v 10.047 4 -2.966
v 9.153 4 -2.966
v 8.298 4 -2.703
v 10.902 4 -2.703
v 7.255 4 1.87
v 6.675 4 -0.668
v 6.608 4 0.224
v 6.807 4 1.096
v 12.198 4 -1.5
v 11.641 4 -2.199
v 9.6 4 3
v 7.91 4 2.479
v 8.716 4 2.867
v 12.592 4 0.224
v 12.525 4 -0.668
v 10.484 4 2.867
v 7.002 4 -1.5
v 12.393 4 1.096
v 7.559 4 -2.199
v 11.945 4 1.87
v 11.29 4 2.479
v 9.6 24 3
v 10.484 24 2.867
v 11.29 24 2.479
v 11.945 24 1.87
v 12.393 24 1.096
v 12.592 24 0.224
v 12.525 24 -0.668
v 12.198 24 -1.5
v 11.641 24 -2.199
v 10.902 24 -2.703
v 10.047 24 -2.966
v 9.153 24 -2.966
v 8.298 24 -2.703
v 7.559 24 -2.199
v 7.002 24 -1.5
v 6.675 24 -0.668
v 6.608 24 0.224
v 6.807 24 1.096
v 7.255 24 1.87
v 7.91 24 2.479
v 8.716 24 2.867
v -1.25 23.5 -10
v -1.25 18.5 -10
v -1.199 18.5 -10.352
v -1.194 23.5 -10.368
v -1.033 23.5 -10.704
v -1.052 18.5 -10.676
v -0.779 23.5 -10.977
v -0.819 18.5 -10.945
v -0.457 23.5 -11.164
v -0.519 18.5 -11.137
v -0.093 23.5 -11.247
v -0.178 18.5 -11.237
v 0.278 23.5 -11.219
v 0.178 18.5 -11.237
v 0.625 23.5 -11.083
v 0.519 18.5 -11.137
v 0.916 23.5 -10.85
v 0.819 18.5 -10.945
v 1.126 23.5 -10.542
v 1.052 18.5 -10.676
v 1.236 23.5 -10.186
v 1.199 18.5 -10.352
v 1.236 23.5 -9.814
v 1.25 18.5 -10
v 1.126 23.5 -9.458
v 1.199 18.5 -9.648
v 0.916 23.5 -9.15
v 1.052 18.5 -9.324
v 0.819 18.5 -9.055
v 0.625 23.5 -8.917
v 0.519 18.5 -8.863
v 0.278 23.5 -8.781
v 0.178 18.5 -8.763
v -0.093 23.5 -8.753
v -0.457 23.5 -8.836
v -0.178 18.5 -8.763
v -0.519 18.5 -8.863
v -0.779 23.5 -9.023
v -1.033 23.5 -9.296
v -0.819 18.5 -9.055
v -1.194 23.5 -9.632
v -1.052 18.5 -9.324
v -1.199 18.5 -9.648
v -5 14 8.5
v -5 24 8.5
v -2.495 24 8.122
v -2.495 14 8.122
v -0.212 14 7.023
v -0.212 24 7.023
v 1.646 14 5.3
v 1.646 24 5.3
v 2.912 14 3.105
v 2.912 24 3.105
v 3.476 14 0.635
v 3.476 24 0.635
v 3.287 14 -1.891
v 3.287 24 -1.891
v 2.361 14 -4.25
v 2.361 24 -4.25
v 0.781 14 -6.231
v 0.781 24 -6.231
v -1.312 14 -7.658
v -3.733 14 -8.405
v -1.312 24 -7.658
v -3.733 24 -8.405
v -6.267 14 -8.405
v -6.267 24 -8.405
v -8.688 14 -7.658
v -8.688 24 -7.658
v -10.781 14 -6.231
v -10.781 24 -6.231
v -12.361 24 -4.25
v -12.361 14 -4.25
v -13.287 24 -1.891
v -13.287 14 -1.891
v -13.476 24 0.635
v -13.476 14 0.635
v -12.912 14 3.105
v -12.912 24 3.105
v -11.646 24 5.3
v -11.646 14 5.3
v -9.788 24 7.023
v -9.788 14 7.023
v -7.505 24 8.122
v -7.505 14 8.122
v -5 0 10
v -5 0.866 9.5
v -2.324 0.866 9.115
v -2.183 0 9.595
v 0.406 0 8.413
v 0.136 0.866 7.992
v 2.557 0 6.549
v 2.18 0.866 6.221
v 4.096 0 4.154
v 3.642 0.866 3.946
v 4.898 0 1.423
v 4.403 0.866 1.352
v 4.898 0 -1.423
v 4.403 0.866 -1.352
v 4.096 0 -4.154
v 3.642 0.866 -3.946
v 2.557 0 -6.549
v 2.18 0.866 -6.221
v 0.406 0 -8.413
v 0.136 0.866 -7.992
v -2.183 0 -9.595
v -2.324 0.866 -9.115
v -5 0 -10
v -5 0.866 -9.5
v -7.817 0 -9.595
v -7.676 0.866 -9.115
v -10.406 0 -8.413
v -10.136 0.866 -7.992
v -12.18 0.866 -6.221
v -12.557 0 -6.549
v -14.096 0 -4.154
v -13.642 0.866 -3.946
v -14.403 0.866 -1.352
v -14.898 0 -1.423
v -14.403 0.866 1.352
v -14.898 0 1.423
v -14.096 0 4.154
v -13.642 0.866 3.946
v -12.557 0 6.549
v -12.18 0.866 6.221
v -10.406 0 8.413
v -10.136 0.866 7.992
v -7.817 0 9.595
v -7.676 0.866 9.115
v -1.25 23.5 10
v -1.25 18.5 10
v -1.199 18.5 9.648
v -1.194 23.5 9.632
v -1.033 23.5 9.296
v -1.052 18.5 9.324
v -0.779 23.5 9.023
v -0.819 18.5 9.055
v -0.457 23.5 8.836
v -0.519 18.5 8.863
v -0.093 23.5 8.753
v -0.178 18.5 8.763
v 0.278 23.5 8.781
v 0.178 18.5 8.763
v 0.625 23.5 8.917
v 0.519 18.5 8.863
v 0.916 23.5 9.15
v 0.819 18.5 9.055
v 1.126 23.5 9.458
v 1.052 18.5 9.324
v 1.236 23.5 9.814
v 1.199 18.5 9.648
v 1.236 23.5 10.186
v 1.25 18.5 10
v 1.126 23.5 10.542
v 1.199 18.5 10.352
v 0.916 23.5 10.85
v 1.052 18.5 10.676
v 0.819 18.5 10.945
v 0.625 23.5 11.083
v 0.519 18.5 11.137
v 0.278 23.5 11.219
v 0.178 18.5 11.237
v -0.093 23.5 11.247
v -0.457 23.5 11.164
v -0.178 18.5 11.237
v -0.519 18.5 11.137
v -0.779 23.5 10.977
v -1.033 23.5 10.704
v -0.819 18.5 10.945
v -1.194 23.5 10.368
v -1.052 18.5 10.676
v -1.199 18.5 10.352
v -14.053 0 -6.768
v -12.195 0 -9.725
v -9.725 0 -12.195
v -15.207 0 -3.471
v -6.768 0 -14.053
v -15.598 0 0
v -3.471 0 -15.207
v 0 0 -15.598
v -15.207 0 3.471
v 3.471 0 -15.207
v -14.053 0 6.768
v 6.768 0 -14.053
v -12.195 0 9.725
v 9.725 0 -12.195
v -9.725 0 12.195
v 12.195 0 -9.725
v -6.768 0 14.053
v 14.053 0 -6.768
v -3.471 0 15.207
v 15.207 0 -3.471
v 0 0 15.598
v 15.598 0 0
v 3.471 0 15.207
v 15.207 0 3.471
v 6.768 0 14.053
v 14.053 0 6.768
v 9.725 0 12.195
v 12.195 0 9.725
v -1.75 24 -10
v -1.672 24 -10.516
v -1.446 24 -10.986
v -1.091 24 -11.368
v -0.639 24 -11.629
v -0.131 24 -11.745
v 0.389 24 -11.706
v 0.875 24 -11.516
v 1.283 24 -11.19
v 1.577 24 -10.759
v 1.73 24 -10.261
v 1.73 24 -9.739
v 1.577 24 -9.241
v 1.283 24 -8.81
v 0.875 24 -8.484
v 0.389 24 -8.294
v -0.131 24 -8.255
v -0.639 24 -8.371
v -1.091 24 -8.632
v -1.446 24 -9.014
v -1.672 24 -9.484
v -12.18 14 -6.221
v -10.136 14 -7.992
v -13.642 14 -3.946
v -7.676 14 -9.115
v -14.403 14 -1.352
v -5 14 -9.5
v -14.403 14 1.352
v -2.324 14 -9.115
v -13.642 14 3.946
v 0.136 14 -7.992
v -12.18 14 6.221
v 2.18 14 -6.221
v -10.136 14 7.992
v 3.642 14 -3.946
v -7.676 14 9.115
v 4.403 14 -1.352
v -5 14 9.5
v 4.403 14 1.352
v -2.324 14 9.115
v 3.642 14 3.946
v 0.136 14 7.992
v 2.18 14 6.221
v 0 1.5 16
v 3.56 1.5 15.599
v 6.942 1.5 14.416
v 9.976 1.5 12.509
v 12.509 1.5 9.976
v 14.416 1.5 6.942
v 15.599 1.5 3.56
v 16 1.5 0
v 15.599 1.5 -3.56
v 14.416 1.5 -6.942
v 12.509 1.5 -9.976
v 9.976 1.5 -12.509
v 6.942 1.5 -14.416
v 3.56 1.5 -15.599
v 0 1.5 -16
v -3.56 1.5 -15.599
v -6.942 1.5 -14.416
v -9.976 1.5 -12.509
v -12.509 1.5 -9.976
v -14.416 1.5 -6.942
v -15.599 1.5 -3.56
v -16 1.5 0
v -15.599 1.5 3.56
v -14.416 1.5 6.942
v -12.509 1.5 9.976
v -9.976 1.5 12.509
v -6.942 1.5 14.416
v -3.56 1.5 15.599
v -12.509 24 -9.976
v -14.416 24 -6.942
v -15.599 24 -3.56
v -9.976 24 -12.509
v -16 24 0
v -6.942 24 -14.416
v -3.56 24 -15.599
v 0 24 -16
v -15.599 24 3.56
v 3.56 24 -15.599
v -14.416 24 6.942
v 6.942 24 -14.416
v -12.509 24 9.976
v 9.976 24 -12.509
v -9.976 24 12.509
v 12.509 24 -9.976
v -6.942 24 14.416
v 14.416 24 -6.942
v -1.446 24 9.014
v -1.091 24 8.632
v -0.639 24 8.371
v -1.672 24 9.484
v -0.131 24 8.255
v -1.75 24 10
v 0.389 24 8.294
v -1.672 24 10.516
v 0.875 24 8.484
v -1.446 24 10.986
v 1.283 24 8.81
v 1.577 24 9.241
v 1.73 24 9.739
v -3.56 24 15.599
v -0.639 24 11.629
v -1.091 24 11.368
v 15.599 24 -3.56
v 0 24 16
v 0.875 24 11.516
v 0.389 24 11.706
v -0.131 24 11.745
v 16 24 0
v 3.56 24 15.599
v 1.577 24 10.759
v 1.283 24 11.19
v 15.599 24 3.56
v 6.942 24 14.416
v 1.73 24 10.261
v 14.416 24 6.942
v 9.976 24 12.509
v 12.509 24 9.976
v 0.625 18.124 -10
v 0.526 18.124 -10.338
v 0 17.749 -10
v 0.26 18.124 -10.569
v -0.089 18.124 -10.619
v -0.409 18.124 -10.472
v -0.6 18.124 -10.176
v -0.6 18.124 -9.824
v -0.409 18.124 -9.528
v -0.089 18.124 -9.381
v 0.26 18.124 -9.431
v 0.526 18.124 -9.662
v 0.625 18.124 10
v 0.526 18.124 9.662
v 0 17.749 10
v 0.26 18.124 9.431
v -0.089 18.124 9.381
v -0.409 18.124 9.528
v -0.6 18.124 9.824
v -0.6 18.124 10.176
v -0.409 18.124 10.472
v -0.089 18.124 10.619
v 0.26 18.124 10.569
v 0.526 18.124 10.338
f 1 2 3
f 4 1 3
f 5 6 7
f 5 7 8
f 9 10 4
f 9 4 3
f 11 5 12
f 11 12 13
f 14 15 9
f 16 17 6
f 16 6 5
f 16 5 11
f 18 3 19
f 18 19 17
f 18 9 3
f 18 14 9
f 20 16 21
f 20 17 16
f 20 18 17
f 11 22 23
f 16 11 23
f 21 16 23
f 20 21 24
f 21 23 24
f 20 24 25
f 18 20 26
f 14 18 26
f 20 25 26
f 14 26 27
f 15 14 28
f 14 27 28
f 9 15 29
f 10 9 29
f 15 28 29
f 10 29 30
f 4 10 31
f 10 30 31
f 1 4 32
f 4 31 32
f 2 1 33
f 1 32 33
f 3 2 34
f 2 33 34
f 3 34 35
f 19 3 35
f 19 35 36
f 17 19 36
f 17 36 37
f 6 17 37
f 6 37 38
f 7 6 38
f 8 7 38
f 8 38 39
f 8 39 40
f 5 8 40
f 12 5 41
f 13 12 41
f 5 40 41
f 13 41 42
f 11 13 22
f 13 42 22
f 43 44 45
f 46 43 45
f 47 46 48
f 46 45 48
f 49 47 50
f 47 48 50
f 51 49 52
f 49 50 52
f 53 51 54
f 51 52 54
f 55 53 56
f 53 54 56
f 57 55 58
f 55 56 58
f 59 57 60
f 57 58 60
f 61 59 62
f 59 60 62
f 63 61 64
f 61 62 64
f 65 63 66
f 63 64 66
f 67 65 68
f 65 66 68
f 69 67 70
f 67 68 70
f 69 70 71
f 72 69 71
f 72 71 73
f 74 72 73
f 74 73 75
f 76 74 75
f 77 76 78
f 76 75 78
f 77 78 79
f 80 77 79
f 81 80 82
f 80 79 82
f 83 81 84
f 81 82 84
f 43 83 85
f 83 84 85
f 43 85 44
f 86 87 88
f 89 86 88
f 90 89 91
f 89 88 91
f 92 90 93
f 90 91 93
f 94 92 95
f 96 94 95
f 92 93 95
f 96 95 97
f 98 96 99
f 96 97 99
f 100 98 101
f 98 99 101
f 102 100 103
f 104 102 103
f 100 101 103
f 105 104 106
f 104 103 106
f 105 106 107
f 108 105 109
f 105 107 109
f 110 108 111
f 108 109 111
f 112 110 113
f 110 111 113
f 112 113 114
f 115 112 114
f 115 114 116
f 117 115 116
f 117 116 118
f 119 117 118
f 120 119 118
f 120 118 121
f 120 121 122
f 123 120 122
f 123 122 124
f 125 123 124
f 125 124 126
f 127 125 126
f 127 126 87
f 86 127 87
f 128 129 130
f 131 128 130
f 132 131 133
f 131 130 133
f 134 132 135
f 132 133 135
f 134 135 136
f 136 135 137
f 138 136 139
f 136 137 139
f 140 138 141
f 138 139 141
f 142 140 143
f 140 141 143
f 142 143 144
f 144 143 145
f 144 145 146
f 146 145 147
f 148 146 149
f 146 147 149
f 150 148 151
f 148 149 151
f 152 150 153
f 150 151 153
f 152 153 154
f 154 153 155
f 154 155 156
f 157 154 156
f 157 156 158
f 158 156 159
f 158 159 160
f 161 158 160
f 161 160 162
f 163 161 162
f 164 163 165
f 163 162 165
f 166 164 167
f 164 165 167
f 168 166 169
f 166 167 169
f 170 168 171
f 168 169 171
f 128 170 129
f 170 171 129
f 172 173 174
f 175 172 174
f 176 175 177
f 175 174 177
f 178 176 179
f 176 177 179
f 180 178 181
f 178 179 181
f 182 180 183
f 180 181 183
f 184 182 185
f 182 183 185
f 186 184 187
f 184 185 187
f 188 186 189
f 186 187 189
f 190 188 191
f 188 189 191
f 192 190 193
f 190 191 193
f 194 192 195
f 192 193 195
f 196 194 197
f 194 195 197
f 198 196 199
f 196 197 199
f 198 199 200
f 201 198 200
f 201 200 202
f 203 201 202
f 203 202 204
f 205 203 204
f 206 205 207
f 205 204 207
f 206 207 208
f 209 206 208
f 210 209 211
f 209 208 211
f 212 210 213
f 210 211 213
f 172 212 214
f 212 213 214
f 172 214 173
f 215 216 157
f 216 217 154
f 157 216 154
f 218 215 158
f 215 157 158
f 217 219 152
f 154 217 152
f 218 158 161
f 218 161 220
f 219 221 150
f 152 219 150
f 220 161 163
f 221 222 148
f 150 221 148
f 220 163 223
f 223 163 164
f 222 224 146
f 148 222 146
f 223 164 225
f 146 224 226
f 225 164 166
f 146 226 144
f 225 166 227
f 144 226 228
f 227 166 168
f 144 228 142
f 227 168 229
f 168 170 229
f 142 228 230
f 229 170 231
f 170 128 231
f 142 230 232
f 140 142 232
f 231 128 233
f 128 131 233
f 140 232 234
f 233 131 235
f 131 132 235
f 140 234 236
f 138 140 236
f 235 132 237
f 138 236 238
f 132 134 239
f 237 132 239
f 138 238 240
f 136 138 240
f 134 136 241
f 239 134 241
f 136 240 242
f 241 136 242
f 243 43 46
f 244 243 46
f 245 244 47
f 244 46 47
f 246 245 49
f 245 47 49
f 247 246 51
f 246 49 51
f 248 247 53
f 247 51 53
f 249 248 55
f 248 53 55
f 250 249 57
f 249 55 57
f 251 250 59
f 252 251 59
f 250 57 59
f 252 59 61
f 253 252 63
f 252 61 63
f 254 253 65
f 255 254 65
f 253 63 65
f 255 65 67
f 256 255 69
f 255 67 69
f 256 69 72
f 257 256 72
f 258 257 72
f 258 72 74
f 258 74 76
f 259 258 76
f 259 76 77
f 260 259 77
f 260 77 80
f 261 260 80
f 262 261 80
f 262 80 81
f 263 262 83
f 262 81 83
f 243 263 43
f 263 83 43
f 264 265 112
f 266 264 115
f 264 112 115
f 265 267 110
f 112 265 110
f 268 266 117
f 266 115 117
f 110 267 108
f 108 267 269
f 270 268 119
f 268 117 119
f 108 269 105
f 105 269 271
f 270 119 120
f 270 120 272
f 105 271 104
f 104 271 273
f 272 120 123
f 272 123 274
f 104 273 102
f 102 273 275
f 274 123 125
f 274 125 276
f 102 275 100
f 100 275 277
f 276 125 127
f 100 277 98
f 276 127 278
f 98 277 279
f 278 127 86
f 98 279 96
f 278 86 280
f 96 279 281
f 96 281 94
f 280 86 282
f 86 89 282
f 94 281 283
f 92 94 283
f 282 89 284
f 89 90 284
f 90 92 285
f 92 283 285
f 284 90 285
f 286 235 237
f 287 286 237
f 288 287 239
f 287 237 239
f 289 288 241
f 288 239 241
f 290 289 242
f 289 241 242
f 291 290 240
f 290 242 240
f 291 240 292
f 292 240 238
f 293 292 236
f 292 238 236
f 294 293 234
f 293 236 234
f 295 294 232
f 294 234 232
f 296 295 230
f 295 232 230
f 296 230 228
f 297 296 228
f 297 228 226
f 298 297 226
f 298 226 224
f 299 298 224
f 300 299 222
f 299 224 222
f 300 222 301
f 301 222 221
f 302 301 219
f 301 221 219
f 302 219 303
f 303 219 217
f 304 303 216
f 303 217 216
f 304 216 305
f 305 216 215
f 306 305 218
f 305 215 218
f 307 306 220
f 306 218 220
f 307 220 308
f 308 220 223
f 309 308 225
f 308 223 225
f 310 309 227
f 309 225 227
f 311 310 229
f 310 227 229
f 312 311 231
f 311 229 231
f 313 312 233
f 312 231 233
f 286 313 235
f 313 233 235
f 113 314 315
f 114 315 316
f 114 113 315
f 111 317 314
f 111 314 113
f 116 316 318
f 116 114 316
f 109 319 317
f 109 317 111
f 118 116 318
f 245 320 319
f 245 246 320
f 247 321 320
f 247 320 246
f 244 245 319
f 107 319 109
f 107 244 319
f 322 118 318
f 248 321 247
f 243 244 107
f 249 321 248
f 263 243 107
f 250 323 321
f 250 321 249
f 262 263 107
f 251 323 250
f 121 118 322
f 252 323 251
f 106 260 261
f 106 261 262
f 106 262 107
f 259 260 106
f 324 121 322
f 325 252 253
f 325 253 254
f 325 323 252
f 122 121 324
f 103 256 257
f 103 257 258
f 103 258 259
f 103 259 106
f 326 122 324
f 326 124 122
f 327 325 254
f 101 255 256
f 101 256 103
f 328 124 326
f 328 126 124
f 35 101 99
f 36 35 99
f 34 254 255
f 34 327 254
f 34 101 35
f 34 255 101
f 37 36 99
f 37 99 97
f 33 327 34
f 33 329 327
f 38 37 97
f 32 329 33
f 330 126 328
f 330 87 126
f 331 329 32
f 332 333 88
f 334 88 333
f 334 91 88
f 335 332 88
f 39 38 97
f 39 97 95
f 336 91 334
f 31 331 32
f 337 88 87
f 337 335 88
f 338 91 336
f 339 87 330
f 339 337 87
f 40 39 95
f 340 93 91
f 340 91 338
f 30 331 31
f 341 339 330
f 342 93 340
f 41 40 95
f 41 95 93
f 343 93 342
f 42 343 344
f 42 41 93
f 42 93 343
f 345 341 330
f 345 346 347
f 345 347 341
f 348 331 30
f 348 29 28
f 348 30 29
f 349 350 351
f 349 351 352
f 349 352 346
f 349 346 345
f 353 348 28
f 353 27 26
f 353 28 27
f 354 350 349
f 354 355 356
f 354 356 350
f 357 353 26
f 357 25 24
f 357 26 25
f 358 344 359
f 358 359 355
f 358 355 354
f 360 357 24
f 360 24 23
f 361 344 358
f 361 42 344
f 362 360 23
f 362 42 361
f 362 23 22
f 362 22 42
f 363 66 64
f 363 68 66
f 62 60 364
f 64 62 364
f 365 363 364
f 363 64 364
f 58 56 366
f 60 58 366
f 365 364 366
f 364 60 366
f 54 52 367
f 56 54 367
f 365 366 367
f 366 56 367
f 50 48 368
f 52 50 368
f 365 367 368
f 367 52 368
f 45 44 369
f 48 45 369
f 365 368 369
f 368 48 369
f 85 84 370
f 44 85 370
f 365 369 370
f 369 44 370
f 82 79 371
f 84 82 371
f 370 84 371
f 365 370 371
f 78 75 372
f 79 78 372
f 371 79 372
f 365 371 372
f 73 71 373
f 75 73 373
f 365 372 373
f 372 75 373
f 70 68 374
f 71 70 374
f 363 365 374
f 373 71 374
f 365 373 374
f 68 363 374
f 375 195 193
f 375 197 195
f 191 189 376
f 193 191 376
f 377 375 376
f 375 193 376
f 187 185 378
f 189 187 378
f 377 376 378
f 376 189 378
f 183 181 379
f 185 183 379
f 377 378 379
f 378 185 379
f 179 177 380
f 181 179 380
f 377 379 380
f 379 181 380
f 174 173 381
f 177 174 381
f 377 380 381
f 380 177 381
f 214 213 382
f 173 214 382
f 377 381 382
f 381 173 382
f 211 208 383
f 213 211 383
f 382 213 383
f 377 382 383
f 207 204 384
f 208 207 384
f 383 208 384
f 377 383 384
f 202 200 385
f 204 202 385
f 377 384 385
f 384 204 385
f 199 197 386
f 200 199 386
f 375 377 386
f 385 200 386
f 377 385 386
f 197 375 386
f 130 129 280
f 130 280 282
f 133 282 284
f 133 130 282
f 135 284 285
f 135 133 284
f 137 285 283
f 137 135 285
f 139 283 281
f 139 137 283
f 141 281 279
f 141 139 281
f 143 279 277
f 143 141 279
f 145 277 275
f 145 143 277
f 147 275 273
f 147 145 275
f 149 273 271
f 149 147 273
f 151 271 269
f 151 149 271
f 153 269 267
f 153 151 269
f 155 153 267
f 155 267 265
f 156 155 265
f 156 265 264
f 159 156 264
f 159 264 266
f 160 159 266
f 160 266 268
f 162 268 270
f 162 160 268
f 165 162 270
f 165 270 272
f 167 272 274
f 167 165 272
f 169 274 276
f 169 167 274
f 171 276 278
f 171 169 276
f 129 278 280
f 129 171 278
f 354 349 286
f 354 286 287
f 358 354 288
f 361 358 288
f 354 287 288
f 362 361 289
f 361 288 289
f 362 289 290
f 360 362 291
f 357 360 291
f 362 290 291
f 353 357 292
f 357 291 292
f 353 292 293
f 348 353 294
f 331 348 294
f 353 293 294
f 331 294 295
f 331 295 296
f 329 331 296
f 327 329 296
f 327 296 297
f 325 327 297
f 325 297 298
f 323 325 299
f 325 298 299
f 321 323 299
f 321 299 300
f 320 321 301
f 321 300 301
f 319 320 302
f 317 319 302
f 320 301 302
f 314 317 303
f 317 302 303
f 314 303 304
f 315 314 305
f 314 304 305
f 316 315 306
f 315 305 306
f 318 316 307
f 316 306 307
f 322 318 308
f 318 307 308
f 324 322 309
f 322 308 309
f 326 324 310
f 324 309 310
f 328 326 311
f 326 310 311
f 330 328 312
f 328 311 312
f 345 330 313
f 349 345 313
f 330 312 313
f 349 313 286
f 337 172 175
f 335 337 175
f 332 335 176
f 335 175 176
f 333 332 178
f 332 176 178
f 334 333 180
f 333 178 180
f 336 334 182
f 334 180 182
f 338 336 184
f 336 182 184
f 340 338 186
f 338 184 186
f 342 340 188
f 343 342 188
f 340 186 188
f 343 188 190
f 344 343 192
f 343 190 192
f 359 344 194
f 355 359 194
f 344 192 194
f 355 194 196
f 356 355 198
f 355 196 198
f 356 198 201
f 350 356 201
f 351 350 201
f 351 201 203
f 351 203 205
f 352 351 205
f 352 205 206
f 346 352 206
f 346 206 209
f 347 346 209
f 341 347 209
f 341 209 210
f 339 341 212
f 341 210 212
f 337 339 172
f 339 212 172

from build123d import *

# Parameters (mm, degrees)
SKETCH_1_R          = 16
EXTRUDE_1_DEPTH     = 24
SKETCH_2_R          = 8.5
CUT_EXTRUDE_1_DEPTH = 14
SKETCH_3_R          = 3
CUT_EXTRUDE_2_DEPTH = 20
SKETCH_4_R          = 9.5
CUT_EXTRUDE_4_DEPTH = 14
CHAMFER_1_SIZE      = 0.5
CHAMFER_1_SIZE2     = 0.866025404
CHAMFER_2_SIZE      = 1.5
CHAMFER_2_SIZE2     = 0.401923789
M3X0_51_D           = 2.5
M3X0_51_DEPTH       = 5.5
M3X0_51_TIP         = 0.751075774
CHAMFER_3_SIZE      = 0.5


with BuildPart() as part:
    # Эскиз1 → Бобышка-Вытянуть1 (new body)
    with BuildSketch(Plane(origin=(0, 0, 0), x_dir=(1, 0, 0), z_dir=(0, 1, 0))):
        with Locations(Location((0, 0, 0), (0, 0, 270))):
            Circle(SKETCH_1_R)
    extrude(amount=EXTRUDE_1_DEPTH)

    # Эскиз2 → Вырез-Вытянуть1 (cut)
    with BuildSketch(Plane(origin=(0, 24, 0), x_dir=(1, 0, 0), z_dir=(0, 1, 0))):
        with Locations(Location((-5, 0, 0), (0, 0, 270))):
            Circle(SKETCH_2_R)
    extrude(amount=-CUT_EXTRUDE_1_DEPTH, mode=Mode.SUBTRACT)

    # Эскиз3 → Вырез-Вытянуть2 (cut)
    with BuildSketch(Plane(origin=(0, 24, 0), x_dir=(1, 0, 0), z_dir=(0, 1, 0))):
        with Locations(Location((9.6, 0, 0), (0, 0, 270))):
            Circle(SKETCH_3_R)
    extrude(amount=-CUT_EXTRUDE_2_DEPTH, mode=Mode.SUBTRACT)

    # Эскиз4 → Вырез-Вытянуть4 (cut)
    with BuildSketch(Plane(origin=(0, 0, 0), x_dir=(1, 0, 0), z_dir=(0, 1, 0))):
        with Locations(Location((-5, 0, 0), (0, 0, 270))):
            Circle(SKETCH_4_R)
    extrude(amount=CUT_EXTRUDE_4_DEPTH, mode=Mode.SUBTRACT)

    # Фаска1
    chamfer_1_edges = [part.edges().sort_by_distance(p)[0] for p in [
        (-5, 0, -9.5),
    ]]
    chamfer_1_side = [part.faces().sort_by_distance(p)[0] for p in [
        (0, 0, -15.54745166),
    ]]
    chamfer(chamfer_1_edges, length=CHAMFER_1_SIZE, length2=CHAMFER_1_SIZE2, reference=chamfer_1_side[0])

    # Фаска2
    chamfer_2_edges = [part.edges().sort_by_distance(p)[0] for p in [
        (0, 0, -16),
    ]]
    chamfer_2_side = [part.faces().sort_by_distance(p)[0] for p in [
        (0, 12, -16),
    ]]
    chamfer(chamfer_2_edges, length=CHAMFER_2_SIZE, length2=CHAMFER_2_SIZE2, reference=chamfer_2_side[0])

    # Отверстие обработанное метчиком M3x0.51
    with Locations(Plane(origin=(0, 24, 0), x_dir=(1, 0, 0), z_dir=(0, 1, 0))):
        with Locations((0, 10), (0, -10)):
            Hole(M3X0_51_D / 2, depth=M3X0_51_DEPTH)
            with Locations((0, 0, -(M3X0_51_DEPTH + M3X0_51_TIP / 2))):  # 118° drill point
                Cone(0, M3X0_51_D / 2, M3X0_51_TIP, mode=Mode.SUBTRACT)

    # Фаска3
    chamfer_3_edges = [part.edges().sort_by_distance(p)[0] for p in [
        (1.25, 24, 10),
        (1.25, 24, -10),
    ]]
    chamfer(chamfer_3_edges, length=CHAMFER_3_SIZE)


solid = part.part
